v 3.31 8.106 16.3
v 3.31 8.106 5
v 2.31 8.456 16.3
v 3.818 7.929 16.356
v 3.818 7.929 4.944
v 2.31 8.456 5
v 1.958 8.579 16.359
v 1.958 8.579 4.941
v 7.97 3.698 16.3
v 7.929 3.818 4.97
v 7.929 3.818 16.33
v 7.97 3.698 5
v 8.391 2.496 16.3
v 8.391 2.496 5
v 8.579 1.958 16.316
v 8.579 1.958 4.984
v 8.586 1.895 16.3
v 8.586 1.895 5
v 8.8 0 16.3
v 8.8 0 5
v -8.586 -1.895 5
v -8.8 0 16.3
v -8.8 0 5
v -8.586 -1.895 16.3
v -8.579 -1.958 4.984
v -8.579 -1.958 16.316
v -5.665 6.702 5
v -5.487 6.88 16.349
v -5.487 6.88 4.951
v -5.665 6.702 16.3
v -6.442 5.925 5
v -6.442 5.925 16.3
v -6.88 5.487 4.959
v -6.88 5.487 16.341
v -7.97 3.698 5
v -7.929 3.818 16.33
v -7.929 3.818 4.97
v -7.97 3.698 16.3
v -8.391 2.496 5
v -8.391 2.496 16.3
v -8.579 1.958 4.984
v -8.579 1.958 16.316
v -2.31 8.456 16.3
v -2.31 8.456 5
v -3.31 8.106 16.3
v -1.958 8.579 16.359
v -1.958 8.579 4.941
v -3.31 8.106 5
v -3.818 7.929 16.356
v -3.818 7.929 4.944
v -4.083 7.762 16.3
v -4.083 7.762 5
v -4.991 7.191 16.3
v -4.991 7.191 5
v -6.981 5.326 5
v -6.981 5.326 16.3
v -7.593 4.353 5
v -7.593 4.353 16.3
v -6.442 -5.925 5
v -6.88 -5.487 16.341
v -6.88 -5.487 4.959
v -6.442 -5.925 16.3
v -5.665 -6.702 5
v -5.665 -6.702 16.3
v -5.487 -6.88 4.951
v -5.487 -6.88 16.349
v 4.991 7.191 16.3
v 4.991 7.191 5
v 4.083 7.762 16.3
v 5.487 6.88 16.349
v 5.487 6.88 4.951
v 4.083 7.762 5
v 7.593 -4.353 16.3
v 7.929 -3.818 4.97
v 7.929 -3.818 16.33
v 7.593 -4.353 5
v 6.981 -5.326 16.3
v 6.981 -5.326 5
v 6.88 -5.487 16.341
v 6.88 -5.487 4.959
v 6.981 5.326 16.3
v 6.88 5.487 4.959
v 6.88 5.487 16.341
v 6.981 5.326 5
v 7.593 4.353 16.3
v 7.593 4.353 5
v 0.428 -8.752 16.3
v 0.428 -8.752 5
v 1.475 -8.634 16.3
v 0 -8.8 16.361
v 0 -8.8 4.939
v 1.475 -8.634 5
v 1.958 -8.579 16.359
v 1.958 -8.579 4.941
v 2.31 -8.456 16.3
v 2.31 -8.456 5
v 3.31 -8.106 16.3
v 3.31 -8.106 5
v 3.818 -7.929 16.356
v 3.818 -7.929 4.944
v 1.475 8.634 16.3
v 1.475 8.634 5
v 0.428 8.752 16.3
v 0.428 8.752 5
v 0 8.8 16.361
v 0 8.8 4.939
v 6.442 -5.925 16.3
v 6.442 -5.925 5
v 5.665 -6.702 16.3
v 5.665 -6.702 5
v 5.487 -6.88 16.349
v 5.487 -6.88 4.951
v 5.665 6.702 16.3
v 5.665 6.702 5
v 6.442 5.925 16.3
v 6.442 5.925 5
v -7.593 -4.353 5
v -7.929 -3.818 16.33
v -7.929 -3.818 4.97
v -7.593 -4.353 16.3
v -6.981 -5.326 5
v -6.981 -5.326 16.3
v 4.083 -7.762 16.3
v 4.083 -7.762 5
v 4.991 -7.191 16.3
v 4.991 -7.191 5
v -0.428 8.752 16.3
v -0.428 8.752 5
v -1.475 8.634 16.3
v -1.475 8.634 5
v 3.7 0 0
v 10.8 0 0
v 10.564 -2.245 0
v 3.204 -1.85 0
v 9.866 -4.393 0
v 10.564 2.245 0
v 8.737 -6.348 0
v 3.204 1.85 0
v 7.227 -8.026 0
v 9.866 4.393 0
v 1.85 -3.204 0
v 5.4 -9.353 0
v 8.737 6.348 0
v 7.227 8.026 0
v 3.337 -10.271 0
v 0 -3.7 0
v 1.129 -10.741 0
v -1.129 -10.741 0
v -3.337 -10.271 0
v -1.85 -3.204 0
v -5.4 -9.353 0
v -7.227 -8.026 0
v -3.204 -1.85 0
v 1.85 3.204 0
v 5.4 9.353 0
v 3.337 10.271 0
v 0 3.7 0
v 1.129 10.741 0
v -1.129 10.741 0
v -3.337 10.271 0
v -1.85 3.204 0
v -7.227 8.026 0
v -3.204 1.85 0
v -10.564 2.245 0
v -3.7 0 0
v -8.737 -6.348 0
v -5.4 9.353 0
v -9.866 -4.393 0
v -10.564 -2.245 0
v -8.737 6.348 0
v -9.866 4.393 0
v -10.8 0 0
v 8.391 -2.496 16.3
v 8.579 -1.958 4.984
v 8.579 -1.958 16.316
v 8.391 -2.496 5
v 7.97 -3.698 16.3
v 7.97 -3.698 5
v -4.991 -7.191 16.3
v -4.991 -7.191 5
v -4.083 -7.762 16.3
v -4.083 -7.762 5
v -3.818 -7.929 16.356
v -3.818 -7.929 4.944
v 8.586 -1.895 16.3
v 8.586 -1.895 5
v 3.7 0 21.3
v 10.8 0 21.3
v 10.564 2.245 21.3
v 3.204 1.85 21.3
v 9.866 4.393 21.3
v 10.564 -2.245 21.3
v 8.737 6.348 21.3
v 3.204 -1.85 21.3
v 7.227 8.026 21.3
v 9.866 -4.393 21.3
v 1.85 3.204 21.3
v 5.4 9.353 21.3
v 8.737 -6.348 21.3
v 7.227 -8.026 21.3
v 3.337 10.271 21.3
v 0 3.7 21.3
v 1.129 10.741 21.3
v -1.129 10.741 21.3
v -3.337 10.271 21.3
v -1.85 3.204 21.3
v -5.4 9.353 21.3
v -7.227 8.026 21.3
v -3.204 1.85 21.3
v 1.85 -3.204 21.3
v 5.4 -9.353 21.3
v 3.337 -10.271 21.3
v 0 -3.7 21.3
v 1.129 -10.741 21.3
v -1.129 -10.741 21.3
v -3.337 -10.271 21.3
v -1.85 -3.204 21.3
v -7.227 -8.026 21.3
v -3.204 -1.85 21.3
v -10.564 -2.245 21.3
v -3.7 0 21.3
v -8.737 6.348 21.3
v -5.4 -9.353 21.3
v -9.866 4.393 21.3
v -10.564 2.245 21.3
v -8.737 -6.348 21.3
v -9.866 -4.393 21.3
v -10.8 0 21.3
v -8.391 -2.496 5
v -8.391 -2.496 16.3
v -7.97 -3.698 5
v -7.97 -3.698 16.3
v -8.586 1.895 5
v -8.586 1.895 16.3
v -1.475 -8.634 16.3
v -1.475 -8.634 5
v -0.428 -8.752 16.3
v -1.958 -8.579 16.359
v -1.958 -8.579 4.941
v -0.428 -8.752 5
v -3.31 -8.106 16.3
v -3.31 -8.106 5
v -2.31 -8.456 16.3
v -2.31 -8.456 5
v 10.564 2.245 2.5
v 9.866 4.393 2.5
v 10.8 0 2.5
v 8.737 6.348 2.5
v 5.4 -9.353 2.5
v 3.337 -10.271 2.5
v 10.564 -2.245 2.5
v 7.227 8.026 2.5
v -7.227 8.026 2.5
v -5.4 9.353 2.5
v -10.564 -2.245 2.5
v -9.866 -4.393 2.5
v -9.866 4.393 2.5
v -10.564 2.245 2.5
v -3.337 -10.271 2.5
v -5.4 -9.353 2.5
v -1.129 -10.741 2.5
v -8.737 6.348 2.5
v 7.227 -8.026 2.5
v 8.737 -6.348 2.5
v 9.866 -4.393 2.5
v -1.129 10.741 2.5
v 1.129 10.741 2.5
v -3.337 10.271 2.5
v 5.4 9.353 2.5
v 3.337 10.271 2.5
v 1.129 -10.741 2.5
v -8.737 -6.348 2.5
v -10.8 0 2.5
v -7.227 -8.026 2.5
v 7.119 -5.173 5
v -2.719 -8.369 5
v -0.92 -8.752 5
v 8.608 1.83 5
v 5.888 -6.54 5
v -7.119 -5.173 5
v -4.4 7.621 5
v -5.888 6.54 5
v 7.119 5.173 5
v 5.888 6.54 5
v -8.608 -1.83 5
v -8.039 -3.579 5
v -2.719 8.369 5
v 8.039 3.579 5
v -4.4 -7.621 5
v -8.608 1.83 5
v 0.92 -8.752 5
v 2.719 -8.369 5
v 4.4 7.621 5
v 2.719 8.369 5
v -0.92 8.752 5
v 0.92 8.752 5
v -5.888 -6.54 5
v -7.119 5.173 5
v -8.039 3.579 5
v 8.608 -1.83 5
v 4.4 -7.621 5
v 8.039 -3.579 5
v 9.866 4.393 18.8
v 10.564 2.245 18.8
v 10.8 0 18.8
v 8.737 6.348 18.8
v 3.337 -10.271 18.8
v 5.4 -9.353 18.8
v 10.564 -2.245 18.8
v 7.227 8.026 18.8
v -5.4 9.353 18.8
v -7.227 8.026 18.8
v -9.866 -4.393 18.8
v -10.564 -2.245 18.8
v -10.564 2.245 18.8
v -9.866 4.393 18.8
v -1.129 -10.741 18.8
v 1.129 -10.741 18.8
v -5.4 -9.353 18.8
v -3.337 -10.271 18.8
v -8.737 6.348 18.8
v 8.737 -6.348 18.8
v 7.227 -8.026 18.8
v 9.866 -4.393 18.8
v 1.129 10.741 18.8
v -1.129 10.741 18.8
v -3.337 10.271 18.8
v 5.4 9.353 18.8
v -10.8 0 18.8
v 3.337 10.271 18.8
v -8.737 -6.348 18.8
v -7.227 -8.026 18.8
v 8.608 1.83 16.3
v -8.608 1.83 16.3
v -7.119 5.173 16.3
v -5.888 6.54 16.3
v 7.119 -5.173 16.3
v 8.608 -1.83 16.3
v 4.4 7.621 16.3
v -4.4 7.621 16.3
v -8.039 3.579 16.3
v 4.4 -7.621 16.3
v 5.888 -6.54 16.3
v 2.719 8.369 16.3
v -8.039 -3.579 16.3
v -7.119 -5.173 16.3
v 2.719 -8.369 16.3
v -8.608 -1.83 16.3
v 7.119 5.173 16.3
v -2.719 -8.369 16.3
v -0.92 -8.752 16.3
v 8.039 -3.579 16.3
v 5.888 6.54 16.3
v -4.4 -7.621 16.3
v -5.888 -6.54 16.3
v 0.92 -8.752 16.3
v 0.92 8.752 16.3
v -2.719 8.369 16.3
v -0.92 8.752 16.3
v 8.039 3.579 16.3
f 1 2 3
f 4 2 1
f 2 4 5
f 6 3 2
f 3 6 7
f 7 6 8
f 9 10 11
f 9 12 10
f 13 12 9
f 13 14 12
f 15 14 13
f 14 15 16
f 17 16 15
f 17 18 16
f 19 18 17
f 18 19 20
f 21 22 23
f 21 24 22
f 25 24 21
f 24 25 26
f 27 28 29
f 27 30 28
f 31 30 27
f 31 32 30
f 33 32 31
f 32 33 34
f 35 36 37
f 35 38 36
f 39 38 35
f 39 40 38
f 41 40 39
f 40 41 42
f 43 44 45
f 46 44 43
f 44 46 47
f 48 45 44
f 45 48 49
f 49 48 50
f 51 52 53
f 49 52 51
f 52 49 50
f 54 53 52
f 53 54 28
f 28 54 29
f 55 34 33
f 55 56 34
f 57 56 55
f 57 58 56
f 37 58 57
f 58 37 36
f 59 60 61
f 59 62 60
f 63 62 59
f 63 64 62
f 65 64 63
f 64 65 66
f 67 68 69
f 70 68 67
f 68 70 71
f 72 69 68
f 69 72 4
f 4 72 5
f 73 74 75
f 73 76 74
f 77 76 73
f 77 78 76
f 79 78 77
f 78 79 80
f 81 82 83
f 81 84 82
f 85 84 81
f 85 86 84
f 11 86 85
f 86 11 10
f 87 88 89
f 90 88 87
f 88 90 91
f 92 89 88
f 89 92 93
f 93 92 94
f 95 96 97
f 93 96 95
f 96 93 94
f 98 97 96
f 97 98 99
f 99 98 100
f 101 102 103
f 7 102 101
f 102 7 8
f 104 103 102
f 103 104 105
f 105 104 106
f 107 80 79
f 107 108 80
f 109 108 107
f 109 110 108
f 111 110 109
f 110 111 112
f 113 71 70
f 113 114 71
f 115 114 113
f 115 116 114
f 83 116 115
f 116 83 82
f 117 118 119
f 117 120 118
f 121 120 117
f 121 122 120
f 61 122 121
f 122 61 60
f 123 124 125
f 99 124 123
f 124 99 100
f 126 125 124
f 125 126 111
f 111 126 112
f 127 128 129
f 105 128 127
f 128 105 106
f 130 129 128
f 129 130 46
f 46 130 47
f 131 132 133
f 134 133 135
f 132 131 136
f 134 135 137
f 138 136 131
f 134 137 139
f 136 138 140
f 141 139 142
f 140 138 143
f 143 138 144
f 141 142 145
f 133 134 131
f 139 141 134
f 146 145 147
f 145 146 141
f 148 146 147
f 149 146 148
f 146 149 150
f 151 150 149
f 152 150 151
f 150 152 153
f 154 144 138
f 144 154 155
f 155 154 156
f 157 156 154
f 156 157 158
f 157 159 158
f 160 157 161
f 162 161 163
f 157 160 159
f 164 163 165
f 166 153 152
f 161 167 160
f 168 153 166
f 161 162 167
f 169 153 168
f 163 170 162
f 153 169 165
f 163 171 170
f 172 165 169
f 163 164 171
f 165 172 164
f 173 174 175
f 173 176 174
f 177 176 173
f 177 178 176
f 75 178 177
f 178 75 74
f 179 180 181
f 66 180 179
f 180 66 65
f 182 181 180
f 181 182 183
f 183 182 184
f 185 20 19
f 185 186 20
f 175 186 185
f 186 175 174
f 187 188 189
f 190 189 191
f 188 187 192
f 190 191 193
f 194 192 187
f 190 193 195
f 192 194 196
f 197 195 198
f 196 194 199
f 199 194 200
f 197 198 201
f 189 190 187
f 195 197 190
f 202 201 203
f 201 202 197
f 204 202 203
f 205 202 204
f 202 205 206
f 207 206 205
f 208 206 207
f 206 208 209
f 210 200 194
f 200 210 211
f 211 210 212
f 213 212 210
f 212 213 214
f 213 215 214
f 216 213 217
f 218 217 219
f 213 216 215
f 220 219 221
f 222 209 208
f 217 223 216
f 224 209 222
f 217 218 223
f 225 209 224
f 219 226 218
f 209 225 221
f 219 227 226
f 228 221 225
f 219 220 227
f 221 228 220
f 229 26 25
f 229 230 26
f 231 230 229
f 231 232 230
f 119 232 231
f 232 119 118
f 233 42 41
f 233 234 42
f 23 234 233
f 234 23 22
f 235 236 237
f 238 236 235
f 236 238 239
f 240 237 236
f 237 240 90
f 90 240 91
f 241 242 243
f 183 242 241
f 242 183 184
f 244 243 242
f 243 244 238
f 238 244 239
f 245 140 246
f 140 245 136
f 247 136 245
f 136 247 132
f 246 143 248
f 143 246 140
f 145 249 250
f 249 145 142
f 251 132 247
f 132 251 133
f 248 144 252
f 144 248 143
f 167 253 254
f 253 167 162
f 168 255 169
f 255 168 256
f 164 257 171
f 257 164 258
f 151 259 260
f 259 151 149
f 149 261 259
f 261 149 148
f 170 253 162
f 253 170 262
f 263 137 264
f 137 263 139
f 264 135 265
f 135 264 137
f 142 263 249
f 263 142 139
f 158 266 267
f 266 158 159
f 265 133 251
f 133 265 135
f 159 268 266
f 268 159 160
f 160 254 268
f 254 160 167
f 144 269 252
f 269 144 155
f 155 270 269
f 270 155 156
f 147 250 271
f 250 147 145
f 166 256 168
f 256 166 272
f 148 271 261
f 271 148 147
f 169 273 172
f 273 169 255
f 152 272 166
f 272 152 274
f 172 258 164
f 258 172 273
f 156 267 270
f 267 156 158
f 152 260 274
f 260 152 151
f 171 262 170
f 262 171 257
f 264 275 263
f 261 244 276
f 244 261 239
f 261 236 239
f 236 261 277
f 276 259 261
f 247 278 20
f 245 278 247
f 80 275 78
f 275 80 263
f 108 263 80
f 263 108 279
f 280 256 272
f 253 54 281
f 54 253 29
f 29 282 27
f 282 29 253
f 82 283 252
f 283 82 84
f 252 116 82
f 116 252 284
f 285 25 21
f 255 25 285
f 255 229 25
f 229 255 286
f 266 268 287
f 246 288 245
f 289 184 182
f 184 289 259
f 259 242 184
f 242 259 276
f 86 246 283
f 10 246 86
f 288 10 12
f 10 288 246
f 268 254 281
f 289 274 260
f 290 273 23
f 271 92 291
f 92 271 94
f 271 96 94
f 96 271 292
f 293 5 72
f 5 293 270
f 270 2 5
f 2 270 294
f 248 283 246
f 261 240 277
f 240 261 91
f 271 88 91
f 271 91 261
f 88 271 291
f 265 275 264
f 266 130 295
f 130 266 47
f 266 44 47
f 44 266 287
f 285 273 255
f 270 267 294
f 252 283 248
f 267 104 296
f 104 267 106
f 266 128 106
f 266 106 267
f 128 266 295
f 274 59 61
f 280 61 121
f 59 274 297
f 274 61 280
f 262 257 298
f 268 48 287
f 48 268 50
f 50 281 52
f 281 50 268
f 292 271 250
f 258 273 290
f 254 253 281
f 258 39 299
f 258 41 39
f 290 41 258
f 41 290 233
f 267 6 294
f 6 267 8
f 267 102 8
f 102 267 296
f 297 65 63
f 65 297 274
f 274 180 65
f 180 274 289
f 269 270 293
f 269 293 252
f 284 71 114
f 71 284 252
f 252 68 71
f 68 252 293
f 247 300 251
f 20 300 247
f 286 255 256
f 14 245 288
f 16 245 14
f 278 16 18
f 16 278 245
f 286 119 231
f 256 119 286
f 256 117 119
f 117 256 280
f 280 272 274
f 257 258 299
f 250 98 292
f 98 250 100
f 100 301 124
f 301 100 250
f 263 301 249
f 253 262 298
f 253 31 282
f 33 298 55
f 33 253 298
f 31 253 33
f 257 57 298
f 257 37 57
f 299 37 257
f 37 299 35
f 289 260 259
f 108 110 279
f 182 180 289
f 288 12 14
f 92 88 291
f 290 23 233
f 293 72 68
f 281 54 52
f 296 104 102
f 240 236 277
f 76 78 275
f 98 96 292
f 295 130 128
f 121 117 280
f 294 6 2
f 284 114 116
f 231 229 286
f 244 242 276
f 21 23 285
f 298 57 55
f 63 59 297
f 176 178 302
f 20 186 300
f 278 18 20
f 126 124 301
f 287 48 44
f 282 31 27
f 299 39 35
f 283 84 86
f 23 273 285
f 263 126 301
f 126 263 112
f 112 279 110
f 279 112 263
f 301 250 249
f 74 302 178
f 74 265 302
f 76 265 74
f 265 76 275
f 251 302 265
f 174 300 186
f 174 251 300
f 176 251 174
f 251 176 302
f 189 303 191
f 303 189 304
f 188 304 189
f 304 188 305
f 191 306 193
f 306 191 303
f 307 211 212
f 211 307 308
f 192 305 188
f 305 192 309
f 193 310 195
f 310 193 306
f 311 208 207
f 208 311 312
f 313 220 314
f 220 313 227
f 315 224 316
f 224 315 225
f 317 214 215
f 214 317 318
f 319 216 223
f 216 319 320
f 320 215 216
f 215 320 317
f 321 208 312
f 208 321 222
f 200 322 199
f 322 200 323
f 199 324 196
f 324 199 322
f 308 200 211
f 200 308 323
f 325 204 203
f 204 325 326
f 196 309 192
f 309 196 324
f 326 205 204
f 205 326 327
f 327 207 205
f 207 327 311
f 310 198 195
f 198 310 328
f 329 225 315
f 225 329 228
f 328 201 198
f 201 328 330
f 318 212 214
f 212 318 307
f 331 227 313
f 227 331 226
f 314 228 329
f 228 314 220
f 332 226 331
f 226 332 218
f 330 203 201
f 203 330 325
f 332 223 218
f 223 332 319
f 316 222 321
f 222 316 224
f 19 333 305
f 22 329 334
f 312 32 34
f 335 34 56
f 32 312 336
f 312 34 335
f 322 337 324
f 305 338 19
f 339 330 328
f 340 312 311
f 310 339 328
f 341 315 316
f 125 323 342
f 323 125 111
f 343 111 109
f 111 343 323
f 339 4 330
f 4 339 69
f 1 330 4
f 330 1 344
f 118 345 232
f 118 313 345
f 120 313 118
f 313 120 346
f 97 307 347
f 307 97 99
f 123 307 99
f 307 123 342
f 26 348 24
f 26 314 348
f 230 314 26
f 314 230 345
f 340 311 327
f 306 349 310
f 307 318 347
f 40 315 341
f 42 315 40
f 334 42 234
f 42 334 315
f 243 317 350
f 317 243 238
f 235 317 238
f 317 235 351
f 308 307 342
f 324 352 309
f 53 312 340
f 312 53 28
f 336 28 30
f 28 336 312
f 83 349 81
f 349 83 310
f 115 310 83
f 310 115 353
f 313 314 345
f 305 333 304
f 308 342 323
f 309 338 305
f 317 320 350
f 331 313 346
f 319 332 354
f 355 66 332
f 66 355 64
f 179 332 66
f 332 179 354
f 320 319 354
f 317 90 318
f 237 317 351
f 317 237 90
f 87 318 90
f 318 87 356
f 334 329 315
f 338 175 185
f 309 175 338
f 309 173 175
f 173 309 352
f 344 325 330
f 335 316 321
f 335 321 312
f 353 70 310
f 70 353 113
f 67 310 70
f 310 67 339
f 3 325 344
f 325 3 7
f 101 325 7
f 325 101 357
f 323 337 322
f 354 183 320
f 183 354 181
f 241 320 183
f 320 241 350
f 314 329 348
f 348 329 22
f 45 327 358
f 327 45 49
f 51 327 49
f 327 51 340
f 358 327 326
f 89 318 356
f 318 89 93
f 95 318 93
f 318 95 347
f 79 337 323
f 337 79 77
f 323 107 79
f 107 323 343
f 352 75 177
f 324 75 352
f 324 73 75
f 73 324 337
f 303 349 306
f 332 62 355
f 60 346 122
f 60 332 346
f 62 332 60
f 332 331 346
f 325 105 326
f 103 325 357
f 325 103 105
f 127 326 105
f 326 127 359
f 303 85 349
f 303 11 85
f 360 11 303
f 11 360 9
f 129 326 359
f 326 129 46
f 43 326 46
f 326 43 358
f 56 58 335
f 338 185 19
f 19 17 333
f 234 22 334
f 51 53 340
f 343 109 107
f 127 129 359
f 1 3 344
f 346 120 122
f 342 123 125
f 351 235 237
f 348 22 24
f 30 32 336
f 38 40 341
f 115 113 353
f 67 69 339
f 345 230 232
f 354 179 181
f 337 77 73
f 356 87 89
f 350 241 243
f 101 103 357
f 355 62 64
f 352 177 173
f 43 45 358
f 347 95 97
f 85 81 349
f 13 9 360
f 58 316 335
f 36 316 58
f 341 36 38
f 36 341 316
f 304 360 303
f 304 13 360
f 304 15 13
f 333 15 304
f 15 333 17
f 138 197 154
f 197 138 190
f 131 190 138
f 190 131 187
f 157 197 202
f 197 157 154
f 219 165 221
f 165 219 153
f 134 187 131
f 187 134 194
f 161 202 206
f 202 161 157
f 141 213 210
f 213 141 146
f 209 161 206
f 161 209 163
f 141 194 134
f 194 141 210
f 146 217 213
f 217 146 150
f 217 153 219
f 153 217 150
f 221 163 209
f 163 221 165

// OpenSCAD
/*
Create a thread spool
Created by Mike Creuzer - Mike@Creuzer.com 20120820
Updated 1/14/2013 for Customizer optimization
*/

// Parameters are in mm

// The radius of the spool (half the diameter)
spool_radius = 8.8; // 17.6 / 2 for the toy I used
// The height of the spool
spool_height = 21.3;

// The top and bottom radius
lip_radius = 10.8; // 21.6 / 2 for the toy I used
// The height of the top and bottom
lip_height = 2.5;

// The radius of the whole in the center
spindle_radius = 3.7; // 7.4/2


difference()
{
	union() // Make the spool
	{
		cylinder(r=spool_radius, h=spool_height);
		cylinder(r=lip_radius, h=lip_height);
		translate([0,0,lip_height]) cylinder(r1=lip_radius, r2 = spool_radius, h=lip_height);
		translate([0,0,spool_height-lip_height]) cylinder(r=lip_radius, h=lip_height);
		translate([0,0,spool_height-lip_height-lip_height]) cylinder(r2=lip_radius, r1 = spool_radius, h=lip_height);
	}
	cylinder(r=spindle_radius, h=spool_height); // The hole down the middle
}
